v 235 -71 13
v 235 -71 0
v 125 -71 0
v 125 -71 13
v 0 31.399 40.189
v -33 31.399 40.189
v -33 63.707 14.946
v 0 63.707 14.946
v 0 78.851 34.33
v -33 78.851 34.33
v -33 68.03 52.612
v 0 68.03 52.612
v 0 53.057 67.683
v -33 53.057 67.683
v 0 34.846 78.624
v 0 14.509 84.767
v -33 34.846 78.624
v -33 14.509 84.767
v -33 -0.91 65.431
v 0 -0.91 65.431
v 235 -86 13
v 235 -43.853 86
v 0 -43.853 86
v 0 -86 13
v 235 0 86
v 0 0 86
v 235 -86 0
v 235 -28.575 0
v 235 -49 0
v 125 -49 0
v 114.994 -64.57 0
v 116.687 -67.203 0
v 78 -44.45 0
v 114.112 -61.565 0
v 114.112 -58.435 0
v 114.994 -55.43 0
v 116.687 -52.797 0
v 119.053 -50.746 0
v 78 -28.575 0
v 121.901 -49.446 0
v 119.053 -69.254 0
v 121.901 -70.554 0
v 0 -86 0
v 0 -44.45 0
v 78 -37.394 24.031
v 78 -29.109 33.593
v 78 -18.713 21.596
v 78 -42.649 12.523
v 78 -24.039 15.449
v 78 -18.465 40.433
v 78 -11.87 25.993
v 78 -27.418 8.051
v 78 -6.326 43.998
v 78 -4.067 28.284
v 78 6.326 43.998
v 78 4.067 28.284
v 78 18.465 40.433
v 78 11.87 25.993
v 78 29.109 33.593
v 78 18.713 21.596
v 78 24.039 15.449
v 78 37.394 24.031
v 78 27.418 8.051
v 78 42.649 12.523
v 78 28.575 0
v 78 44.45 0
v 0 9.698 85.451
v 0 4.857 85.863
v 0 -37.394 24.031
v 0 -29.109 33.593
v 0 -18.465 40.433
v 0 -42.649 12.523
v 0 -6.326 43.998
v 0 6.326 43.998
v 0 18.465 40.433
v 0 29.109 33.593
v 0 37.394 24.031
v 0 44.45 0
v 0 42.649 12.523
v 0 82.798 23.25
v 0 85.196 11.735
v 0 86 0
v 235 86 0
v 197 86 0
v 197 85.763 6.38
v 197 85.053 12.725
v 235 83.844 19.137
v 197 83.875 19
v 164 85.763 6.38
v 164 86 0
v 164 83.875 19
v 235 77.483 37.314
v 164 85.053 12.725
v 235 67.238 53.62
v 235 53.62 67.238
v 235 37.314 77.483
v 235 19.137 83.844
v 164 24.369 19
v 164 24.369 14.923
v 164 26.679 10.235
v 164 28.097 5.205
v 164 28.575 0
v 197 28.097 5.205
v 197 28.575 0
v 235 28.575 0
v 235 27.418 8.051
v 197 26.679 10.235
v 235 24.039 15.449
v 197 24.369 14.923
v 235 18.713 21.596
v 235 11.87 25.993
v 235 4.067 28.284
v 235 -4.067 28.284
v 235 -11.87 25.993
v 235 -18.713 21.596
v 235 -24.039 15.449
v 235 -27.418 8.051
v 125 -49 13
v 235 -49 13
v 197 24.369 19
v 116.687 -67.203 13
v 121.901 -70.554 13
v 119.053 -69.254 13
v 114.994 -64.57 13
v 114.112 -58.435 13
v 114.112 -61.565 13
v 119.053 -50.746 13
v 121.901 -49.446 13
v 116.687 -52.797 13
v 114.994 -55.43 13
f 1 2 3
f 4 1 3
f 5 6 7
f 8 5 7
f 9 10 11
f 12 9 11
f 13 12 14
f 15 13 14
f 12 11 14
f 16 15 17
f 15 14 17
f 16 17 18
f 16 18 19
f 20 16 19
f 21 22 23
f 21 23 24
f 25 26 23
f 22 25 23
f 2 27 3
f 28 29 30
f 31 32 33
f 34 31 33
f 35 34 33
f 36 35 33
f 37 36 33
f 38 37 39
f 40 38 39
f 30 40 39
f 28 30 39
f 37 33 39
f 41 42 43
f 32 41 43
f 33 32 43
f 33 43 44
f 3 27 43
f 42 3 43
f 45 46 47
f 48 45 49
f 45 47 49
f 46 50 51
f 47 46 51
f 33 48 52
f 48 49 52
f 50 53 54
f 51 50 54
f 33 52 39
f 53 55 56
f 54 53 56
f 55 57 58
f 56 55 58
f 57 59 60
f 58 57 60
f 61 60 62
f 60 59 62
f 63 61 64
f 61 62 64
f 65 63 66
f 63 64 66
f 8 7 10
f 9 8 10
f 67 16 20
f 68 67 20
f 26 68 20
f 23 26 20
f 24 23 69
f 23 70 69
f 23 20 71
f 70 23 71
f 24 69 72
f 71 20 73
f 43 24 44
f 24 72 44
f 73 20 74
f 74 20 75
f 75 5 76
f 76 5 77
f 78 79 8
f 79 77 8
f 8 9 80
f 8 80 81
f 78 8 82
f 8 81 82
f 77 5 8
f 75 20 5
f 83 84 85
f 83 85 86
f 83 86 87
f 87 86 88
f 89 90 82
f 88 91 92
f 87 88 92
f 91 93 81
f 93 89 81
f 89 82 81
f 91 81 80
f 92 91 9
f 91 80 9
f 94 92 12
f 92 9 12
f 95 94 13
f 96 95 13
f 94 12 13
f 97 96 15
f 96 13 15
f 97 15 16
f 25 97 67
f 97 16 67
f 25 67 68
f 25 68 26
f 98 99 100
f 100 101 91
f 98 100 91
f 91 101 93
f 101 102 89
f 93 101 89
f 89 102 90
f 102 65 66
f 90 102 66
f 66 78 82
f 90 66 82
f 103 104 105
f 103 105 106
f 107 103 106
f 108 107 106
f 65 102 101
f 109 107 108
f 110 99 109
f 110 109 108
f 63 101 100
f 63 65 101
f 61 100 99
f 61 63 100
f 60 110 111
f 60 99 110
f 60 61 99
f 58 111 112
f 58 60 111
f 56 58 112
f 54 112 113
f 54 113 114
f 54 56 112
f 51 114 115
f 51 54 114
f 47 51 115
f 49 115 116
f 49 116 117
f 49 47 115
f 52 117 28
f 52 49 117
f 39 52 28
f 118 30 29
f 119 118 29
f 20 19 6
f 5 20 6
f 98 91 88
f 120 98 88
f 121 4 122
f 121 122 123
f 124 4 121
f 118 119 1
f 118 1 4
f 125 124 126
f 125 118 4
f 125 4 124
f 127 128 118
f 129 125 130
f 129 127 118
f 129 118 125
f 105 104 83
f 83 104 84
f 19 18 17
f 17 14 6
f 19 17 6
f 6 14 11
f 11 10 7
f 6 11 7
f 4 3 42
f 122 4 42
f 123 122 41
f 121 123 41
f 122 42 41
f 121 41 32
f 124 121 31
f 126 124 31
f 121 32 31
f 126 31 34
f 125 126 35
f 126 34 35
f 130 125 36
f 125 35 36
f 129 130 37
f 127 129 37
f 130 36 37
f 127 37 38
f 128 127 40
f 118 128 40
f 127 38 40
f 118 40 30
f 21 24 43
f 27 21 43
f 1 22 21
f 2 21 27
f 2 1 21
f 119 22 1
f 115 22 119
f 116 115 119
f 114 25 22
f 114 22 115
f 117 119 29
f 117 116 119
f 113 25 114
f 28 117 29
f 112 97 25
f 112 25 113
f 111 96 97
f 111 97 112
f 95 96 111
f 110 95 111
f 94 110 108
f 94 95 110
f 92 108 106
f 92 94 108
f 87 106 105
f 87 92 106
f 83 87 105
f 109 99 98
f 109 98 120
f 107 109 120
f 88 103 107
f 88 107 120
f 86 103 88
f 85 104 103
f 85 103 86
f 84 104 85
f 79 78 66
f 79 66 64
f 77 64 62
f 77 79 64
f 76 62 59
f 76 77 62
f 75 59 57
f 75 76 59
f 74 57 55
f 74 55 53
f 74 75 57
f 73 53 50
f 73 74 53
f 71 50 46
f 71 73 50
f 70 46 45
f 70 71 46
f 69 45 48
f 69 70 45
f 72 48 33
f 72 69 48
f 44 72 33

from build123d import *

# Parameters (mm, degrees)
BOSS_EXTRU_1_DEPTH      = 235
ESQUISSE2_R             = 28.575
ENL_V_MAT_EXTRU_1_DEPTH = 235
ESQUISSE3_R             = 44.45
ENL_V_MAT_EXTRU_2_DEPTH = 78
ESQUISSE4_W             = 33
ESQUISSE4_H             = 61.631350579
ENL_V_MAT_EXTRU_3_DEPTH = 19
ENL_V_MAT_EXTRU_4_DEPTH = 13
BOSS_EXTRU_2_START      = -33
BOSS_EXTRU_2_DEPTH      = 33


with BuildPart() as part:
    # Esquisse1 → Boss.-Extru.1 (new body)
    with BuildSketch(Plane(origin=(0, 0, 0), x_dir=(0, 0, -1), z_dir=(1, 0, 0))):
        with BuildLine():
            Line((0, 0), (0, 86))
            ThreePointArc((0, 86), (-60.811183182, 60.811183182), (-86, 0))
            Line((-86, 0), (-86, -43.853430349))
            Line((-86, -43.853430349), (-13, -86))
            Line((-13, -86), (0, -86))
            Line((0, -86), (0, 0))
        make_face()
    extrude(amount=BOSS_EXTRU_1_DEPTH)

    # Esquisse2 → Enlèv. mat.-Extru.1 (cut)
    with BuildSketch(Plane(origin=(0, 0, 0), x_dir=(0, 0, -1), z_dir=(1, 0, 0))):
        Circle(ESQUISSE2_R)
    extrude(amount=ENL_V_MAT_EXTRU_1_DEPTH, mode=Mode.SUBTRACT)

    # Esquisse3 → Enlèv. mat.-Extru.2 (cut)
    with BuildSketch(Plane(origin=(0, 0, 0), x_dir=(0, 0, -1), z_dir=(1, 0, 0))):
        Circle(ESQUISSE3_R)
    extrude(amount=ENL_V_MAT_EXTRU_2_DEPTH, mode=Mode.SUBTRACT)

    # Esquisse4 → Enlèv. mat.-Extru.3 (cut)
    with BuildSketch(Plane.XY):
        with Locations((180.5, 55.184324711)):
            Rectangle(ESQUISSE4_W, ESQUISSE4_H)
    extrude(amount=ENL_V_MAT_EXTRU_3_DEPTH, mode=Mode.SUBTRACT)

    # Esquisse5 → Enlèv. mat.-Extru.4 (cut)
    with BuildSketch(Plane.XY):
        with BuildLine():
            ThreePointArc((125, -71), (114, -60), (125, -49))
            Line((125, -49), (235, -49))
            Line((235, -49), (235, -71))
            Line((235, -71), (125, -71))
        make_face()
    extrude(amount=ENL_V_MAT_EXTRU_4_DEPTH, mode=Mode.SUBTRACT)

    # Esquisse6 → Boss.-Extru.2 (add)
    with BuildSketch(Plane(origin=(0, 0, 0), x_dir=(0, 0, -1), z_dir=(1, 0, 0)).offset(BOSS_EXTRU_2_START)):
        with BuildLine():
            Line((-65.430668922, -0.909705656), (-40.188548434, 31.398735242))
            Line((-40.188548434, 31.398735242), (-14.946427946, 63.707176139))
            Line((-14.946427946, 63.707176139), (-34.329616239, 78.850982549))
            ThreePointArc((-34.329616239, 78.850982549), (-67.683027015, 53.056647596), (-84.767274524, 14.508934135))
            Line((-84.767274524, 14.508934135), (-65.430668922, -0.909705656))
        make_face()
    extrude(amount=BOSS_EXTRU_2_DEPTH)


solid = part.part
